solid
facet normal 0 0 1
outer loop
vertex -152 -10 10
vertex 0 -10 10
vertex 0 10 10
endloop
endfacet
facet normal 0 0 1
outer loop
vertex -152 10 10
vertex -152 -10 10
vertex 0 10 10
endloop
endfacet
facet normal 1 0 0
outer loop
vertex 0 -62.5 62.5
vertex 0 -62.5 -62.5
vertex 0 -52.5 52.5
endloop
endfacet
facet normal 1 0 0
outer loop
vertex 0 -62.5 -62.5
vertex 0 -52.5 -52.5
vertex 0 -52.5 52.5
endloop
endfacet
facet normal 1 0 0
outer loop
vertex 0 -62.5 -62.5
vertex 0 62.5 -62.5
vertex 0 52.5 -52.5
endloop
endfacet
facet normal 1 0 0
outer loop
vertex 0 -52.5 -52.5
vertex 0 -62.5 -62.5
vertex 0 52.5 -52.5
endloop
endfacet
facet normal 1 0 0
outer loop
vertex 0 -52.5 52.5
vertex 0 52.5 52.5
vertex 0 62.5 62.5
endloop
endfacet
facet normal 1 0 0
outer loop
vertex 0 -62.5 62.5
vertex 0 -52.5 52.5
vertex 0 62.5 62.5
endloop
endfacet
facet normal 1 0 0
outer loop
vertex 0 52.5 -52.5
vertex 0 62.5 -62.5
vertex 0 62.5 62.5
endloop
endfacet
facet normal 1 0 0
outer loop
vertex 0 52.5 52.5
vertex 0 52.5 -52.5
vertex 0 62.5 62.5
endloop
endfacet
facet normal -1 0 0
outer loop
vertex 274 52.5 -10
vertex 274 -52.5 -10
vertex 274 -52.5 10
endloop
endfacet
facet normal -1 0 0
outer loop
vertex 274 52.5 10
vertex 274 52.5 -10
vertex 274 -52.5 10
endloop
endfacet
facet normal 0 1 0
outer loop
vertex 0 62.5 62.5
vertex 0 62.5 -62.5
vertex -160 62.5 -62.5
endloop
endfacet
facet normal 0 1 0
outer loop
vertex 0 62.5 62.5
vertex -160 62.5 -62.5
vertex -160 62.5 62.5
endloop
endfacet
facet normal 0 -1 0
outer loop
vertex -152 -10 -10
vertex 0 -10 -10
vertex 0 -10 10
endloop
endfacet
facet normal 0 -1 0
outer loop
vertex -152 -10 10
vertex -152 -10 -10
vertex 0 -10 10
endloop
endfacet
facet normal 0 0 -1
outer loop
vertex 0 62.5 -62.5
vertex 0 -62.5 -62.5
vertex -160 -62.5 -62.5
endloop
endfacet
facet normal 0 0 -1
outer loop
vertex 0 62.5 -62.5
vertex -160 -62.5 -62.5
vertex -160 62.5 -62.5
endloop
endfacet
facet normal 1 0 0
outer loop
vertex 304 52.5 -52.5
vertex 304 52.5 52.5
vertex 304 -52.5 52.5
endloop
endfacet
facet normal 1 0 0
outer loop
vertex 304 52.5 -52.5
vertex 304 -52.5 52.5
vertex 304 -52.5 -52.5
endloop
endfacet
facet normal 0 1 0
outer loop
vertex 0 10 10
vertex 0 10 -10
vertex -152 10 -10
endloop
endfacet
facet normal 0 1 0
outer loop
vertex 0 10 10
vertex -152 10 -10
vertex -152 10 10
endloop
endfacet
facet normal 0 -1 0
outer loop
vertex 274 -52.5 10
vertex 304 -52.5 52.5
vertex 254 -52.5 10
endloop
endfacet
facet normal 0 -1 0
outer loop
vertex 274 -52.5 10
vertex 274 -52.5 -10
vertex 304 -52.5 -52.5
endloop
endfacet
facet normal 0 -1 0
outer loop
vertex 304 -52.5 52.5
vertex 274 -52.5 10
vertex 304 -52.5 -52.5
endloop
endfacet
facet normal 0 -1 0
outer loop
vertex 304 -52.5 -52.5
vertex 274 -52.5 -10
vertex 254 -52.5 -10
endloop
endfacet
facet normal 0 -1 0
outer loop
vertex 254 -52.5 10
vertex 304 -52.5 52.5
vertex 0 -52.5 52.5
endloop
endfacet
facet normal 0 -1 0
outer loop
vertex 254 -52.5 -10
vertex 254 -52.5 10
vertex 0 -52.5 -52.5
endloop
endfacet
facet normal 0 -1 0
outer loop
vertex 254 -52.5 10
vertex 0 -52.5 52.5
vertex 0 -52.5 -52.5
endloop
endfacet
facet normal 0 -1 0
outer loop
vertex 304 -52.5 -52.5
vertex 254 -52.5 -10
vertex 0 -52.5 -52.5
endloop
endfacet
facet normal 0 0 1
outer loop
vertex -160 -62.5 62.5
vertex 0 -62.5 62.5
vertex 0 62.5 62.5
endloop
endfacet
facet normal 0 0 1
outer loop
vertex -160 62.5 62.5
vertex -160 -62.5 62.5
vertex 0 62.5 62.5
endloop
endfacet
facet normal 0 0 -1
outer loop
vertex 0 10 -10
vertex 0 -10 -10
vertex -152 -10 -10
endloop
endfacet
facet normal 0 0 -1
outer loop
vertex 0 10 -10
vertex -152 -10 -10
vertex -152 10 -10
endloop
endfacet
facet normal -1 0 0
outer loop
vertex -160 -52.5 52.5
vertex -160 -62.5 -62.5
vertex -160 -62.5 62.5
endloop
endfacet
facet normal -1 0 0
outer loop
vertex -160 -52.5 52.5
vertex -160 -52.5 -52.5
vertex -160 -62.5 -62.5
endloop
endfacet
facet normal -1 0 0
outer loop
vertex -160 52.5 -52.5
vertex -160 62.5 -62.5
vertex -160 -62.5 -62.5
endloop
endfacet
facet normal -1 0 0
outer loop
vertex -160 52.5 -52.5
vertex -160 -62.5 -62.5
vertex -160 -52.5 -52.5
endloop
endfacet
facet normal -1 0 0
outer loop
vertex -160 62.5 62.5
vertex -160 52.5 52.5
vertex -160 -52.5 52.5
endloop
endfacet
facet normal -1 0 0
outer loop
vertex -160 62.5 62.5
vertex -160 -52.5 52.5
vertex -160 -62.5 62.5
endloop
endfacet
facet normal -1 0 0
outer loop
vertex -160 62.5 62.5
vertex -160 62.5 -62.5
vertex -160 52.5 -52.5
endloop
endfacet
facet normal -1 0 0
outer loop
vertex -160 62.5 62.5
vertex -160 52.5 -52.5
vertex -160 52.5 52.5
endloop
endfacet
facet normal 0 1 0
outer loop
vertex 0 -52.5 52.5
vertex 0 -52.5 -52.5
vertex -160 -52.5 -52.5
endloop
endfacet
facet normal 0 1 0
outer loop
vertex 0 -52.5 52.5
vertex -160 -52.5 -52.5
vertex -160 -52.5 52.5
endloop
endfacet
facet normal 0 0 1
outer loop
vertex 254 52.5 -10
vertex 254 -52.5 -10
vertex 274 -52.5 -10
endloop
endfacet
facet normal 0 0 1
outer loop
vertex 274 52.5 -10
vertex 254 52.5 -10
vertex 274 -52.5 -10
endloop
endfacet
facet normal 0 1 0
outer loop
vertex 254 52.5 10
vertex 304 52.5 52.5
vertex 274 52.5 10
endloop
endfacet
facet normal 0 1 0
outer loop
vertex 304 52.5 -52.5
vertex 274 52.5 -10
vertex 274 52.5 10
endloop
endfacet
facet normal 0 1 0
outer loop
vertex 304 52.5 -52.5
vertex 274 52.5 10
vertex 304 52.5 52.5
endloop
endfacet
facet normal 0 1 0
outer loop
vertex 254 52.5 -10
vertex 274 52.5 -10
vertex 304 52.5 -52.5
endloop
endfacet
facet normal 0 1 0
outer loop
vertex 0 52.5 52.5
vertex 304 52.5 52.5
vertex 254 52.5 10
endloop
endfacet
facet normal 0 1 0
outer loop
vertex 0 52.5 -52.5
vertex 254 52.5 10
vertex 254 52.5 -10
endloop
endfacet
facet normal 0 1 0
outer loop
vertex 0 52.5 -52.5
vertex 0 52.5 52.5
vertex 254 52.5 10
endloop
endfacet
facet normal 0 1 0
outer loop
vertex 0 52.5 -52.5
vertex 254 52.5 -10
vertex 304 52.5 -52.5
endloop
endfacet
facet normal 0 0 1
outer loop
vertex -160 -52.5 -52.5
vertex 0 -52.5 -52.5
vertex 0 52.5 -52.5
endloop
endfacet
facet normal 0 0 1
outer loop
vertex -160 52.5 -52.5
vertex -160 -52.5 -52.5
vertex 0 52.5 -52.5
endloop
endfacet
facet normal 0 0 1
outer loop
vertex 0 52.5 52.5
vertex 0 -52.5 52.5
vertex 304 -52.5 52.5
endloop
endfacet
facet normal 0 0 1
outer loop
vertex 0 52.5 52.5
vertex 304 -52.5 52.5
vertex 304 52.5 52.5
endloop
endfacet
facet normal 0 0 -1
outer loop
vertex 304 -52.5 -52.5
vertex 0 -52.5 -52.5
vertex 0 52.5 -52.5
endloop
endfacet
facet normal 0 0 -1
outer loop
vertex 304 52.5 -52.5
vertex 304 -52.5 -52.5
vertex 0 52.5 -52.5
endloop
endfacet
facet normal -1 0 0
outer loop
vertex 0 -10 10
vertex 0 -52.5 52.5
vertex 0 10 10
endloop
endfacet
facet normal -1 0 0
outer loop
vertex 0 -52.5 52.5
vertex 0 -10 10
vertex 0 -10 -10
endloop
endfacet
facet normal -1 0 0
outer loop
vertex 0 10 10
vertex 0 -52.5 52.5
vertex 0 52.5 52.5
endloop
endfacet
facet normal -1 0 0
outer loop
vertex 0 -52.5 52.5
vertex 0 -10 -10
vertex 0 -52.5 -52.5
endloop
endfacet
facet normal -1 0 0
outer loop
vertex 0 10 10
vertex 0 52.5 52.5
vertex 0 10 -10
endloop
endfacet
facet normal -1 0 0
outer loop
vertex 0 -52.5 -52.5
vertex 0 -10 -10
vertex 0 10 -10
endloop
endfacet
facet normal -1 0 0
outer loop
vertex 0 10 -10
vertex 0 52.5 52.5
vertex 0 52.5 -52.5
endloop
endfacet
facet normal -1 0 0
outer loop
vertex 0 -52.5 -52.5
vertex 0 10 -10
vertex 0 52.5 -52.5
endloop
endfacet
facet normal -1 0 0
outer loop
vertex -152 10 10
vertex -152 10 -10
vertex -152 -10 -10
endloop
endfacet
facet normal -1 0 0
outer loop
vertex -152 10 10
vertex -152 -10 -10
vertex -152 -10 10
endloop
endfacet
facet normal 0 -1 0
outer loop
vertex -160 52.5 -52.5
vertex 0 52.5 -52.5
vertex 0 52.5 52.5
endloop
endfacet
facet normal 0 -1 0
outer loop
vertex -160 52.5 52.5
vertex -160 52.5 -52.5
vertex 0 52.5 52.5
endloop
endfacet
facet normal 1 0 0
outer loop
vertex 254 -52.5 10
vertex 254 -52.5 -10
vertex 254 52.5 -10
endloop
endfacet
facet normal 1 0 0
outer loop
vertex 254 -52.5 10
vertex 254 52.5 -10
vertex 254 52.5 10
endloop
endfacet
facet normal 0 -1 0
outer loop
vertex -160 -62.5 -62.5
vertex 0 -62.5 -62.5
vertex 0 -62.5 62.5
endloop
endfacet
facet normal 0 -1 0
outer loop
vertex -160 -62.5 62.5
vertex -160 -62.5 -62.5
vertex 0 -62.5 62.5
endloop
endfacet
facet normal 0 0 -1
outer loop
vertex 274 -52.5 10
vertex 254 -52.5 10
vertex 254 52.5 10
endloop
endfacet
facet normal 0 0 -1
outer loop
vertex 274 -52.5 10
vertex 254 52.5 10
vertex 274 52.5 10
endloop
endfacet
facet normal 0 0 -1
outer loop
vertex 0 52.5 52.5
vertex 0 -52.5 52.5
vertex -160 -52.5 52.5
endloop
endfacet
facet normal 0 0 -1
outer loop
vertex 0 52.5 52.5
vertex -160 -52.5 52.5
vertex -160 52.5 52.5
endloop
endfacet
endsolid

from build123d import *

# Parameters (mm, degrees)
SKETCH1_W           = 105
SKETCH1_H           = 105
BOSS_EXTRUDE1_DEPTH = 304
SKETCH2_W           = 20
SKETCH2_H           = 20
BOSS_EXTRUDE2_DEPTH = 152
SKETCH3_W           = 125
SKETCH3_H           = 125
SKETCH3_W_2         = 105
SKETCH3_H_2         = 105
EXTRUDE_THIN1_DEPTH = 160
SKETCH4_W           = 20
SKETCH4_H           = 20
CUT_EXTRUDE1_DEPTH  = 160


with BuildPart() as part:
    # Sketch1 → Boss-Extrude1 (new body)
    with BuildSketch(Plane(origin=(0, 0, 0), x_dir=(0, 0, -1), z_dir=(1, 0, 0))):
        Rectangle(SKETCH1_W, SKETCH1_H)
    extrude(amount=BOSS_EXTRUDE1_DEPTH)

    # Sketch2 → Boss-Extrude2 (add)
    with BuildSketch(Plane.ZY):
        Rectangle(SKETCH2_W, SKETCH2_H)
    extrude(amount=BOSS_EXTRUDE2_DEPTH)

    # Sketch4 → Cut-Extrude1 (cut)
    with BuildSketch(Plane.XZ.offset(52.5)):
        with Locations((264, 0)):
            Rectangle(SKETCH4_W, SKETCH4_H)
    extrude(amount=-CUT_EXTRUDE1_DEPTH, mode=Mode.SUBTRACT)


with BuildPart() as body_2:
    # Sketch3 → Extrude-Thin1 (new body)
    with BuildSketch(Plane.ZY):
        Rectangle(SKETCH3_W, SKETCH3_H)
        Rectangle(SKETCH3_W_2, SKETCH3_H_2, mode=Mode.SUBTRACT)
    extrude(amount=EXTRUDE_THIN1_DEPTH)


solid = Compound([part.part, body_2.part])
